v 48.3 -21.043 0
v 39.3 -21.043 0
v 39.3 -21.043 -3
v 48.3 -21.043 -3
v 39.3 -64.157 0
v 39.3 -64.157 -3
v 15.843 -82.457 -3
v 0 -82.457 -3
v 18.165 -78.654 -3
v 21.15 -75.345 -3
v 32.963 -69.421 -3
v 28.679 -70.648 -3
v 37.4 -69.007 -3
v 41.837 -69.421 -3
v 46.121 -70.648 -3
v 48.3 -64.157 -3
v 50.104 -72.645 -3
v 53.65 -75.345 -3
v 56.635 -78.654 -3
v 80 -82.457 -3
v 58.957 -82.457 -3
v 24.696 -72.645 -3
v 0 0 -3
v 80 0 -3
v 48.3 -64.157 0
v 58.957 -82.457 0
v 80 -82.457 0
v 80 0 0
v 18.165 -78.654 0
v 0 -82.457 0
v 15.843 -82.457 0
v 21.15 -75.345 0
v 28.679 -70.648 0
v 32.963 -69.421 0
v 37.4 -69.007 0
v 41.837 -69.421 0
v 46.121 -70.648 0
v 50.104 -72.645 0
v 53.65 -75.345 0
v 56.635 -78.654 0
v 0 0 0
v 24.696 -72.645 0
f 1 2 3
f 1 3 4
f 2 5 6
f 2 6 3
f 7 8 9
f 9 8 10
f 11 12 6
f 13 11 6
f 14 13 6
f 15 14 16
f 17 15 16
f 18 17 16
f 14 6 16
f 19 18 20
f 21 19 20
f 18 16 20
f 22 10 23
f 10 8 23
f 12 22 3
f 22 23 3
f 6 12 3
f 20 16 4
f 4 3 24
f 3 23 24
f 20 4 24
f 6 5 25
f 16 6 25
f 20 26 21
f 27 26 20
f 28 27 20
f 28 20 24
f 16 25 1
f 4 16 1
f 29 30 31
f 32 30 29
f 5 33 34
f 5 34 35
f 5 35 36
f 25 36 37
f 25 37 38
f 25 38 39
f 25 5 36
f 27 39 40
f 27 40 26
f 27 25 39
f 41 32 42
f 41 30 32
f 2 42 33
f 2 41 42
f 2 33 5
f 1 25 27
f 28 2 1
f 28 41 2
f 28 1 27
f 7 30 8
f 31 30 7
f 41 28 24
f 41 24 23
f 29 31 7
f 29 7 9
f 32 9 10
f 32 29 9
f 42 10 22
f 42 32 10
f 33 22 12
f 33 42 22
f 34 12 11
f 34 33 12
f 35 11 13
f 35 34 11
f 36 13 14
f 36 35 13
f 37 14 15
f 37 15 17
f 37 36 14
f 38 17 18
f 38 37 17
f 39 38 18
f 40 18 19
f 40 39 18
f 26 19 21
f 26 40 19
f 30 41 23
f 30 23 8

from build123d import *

# Parameters (mm, degrees)
SKETCH1_W           = 9
SKETCH1_H           = 43.113686922
BOSS_EXTRUDE1_DEPTH = 3


with BuildPart() as part:
    # Sketch1 → Boss-Extrude1 (new body)
    with BuildSketch(Plane.XY):
        with BuildLine():
            Line((0, -82.457009142), (15.843156539, -82.457009142))
            ThreePointArc((15.843156539, -82.457009142), (37.4, -69.007009142), (58.956843461, -82.457009142))
            Line((58.956843461, -82.457009142), (80, -82.457009142))
            Line((80, -82.457009142), (80, 0))
            Line((80, 0), (0, 0))
            Line((0, 0), (0, -82.457009142))
        make_face()
        with Locations((43.8, -42.6)):
            Rectangle(SKETCH1_W, SKETCH1_H, mode=Mode.SUBTRACT)
    extrude(amount=-BOSS_EXTRUDE1_DEPTH)


solid = part.part
